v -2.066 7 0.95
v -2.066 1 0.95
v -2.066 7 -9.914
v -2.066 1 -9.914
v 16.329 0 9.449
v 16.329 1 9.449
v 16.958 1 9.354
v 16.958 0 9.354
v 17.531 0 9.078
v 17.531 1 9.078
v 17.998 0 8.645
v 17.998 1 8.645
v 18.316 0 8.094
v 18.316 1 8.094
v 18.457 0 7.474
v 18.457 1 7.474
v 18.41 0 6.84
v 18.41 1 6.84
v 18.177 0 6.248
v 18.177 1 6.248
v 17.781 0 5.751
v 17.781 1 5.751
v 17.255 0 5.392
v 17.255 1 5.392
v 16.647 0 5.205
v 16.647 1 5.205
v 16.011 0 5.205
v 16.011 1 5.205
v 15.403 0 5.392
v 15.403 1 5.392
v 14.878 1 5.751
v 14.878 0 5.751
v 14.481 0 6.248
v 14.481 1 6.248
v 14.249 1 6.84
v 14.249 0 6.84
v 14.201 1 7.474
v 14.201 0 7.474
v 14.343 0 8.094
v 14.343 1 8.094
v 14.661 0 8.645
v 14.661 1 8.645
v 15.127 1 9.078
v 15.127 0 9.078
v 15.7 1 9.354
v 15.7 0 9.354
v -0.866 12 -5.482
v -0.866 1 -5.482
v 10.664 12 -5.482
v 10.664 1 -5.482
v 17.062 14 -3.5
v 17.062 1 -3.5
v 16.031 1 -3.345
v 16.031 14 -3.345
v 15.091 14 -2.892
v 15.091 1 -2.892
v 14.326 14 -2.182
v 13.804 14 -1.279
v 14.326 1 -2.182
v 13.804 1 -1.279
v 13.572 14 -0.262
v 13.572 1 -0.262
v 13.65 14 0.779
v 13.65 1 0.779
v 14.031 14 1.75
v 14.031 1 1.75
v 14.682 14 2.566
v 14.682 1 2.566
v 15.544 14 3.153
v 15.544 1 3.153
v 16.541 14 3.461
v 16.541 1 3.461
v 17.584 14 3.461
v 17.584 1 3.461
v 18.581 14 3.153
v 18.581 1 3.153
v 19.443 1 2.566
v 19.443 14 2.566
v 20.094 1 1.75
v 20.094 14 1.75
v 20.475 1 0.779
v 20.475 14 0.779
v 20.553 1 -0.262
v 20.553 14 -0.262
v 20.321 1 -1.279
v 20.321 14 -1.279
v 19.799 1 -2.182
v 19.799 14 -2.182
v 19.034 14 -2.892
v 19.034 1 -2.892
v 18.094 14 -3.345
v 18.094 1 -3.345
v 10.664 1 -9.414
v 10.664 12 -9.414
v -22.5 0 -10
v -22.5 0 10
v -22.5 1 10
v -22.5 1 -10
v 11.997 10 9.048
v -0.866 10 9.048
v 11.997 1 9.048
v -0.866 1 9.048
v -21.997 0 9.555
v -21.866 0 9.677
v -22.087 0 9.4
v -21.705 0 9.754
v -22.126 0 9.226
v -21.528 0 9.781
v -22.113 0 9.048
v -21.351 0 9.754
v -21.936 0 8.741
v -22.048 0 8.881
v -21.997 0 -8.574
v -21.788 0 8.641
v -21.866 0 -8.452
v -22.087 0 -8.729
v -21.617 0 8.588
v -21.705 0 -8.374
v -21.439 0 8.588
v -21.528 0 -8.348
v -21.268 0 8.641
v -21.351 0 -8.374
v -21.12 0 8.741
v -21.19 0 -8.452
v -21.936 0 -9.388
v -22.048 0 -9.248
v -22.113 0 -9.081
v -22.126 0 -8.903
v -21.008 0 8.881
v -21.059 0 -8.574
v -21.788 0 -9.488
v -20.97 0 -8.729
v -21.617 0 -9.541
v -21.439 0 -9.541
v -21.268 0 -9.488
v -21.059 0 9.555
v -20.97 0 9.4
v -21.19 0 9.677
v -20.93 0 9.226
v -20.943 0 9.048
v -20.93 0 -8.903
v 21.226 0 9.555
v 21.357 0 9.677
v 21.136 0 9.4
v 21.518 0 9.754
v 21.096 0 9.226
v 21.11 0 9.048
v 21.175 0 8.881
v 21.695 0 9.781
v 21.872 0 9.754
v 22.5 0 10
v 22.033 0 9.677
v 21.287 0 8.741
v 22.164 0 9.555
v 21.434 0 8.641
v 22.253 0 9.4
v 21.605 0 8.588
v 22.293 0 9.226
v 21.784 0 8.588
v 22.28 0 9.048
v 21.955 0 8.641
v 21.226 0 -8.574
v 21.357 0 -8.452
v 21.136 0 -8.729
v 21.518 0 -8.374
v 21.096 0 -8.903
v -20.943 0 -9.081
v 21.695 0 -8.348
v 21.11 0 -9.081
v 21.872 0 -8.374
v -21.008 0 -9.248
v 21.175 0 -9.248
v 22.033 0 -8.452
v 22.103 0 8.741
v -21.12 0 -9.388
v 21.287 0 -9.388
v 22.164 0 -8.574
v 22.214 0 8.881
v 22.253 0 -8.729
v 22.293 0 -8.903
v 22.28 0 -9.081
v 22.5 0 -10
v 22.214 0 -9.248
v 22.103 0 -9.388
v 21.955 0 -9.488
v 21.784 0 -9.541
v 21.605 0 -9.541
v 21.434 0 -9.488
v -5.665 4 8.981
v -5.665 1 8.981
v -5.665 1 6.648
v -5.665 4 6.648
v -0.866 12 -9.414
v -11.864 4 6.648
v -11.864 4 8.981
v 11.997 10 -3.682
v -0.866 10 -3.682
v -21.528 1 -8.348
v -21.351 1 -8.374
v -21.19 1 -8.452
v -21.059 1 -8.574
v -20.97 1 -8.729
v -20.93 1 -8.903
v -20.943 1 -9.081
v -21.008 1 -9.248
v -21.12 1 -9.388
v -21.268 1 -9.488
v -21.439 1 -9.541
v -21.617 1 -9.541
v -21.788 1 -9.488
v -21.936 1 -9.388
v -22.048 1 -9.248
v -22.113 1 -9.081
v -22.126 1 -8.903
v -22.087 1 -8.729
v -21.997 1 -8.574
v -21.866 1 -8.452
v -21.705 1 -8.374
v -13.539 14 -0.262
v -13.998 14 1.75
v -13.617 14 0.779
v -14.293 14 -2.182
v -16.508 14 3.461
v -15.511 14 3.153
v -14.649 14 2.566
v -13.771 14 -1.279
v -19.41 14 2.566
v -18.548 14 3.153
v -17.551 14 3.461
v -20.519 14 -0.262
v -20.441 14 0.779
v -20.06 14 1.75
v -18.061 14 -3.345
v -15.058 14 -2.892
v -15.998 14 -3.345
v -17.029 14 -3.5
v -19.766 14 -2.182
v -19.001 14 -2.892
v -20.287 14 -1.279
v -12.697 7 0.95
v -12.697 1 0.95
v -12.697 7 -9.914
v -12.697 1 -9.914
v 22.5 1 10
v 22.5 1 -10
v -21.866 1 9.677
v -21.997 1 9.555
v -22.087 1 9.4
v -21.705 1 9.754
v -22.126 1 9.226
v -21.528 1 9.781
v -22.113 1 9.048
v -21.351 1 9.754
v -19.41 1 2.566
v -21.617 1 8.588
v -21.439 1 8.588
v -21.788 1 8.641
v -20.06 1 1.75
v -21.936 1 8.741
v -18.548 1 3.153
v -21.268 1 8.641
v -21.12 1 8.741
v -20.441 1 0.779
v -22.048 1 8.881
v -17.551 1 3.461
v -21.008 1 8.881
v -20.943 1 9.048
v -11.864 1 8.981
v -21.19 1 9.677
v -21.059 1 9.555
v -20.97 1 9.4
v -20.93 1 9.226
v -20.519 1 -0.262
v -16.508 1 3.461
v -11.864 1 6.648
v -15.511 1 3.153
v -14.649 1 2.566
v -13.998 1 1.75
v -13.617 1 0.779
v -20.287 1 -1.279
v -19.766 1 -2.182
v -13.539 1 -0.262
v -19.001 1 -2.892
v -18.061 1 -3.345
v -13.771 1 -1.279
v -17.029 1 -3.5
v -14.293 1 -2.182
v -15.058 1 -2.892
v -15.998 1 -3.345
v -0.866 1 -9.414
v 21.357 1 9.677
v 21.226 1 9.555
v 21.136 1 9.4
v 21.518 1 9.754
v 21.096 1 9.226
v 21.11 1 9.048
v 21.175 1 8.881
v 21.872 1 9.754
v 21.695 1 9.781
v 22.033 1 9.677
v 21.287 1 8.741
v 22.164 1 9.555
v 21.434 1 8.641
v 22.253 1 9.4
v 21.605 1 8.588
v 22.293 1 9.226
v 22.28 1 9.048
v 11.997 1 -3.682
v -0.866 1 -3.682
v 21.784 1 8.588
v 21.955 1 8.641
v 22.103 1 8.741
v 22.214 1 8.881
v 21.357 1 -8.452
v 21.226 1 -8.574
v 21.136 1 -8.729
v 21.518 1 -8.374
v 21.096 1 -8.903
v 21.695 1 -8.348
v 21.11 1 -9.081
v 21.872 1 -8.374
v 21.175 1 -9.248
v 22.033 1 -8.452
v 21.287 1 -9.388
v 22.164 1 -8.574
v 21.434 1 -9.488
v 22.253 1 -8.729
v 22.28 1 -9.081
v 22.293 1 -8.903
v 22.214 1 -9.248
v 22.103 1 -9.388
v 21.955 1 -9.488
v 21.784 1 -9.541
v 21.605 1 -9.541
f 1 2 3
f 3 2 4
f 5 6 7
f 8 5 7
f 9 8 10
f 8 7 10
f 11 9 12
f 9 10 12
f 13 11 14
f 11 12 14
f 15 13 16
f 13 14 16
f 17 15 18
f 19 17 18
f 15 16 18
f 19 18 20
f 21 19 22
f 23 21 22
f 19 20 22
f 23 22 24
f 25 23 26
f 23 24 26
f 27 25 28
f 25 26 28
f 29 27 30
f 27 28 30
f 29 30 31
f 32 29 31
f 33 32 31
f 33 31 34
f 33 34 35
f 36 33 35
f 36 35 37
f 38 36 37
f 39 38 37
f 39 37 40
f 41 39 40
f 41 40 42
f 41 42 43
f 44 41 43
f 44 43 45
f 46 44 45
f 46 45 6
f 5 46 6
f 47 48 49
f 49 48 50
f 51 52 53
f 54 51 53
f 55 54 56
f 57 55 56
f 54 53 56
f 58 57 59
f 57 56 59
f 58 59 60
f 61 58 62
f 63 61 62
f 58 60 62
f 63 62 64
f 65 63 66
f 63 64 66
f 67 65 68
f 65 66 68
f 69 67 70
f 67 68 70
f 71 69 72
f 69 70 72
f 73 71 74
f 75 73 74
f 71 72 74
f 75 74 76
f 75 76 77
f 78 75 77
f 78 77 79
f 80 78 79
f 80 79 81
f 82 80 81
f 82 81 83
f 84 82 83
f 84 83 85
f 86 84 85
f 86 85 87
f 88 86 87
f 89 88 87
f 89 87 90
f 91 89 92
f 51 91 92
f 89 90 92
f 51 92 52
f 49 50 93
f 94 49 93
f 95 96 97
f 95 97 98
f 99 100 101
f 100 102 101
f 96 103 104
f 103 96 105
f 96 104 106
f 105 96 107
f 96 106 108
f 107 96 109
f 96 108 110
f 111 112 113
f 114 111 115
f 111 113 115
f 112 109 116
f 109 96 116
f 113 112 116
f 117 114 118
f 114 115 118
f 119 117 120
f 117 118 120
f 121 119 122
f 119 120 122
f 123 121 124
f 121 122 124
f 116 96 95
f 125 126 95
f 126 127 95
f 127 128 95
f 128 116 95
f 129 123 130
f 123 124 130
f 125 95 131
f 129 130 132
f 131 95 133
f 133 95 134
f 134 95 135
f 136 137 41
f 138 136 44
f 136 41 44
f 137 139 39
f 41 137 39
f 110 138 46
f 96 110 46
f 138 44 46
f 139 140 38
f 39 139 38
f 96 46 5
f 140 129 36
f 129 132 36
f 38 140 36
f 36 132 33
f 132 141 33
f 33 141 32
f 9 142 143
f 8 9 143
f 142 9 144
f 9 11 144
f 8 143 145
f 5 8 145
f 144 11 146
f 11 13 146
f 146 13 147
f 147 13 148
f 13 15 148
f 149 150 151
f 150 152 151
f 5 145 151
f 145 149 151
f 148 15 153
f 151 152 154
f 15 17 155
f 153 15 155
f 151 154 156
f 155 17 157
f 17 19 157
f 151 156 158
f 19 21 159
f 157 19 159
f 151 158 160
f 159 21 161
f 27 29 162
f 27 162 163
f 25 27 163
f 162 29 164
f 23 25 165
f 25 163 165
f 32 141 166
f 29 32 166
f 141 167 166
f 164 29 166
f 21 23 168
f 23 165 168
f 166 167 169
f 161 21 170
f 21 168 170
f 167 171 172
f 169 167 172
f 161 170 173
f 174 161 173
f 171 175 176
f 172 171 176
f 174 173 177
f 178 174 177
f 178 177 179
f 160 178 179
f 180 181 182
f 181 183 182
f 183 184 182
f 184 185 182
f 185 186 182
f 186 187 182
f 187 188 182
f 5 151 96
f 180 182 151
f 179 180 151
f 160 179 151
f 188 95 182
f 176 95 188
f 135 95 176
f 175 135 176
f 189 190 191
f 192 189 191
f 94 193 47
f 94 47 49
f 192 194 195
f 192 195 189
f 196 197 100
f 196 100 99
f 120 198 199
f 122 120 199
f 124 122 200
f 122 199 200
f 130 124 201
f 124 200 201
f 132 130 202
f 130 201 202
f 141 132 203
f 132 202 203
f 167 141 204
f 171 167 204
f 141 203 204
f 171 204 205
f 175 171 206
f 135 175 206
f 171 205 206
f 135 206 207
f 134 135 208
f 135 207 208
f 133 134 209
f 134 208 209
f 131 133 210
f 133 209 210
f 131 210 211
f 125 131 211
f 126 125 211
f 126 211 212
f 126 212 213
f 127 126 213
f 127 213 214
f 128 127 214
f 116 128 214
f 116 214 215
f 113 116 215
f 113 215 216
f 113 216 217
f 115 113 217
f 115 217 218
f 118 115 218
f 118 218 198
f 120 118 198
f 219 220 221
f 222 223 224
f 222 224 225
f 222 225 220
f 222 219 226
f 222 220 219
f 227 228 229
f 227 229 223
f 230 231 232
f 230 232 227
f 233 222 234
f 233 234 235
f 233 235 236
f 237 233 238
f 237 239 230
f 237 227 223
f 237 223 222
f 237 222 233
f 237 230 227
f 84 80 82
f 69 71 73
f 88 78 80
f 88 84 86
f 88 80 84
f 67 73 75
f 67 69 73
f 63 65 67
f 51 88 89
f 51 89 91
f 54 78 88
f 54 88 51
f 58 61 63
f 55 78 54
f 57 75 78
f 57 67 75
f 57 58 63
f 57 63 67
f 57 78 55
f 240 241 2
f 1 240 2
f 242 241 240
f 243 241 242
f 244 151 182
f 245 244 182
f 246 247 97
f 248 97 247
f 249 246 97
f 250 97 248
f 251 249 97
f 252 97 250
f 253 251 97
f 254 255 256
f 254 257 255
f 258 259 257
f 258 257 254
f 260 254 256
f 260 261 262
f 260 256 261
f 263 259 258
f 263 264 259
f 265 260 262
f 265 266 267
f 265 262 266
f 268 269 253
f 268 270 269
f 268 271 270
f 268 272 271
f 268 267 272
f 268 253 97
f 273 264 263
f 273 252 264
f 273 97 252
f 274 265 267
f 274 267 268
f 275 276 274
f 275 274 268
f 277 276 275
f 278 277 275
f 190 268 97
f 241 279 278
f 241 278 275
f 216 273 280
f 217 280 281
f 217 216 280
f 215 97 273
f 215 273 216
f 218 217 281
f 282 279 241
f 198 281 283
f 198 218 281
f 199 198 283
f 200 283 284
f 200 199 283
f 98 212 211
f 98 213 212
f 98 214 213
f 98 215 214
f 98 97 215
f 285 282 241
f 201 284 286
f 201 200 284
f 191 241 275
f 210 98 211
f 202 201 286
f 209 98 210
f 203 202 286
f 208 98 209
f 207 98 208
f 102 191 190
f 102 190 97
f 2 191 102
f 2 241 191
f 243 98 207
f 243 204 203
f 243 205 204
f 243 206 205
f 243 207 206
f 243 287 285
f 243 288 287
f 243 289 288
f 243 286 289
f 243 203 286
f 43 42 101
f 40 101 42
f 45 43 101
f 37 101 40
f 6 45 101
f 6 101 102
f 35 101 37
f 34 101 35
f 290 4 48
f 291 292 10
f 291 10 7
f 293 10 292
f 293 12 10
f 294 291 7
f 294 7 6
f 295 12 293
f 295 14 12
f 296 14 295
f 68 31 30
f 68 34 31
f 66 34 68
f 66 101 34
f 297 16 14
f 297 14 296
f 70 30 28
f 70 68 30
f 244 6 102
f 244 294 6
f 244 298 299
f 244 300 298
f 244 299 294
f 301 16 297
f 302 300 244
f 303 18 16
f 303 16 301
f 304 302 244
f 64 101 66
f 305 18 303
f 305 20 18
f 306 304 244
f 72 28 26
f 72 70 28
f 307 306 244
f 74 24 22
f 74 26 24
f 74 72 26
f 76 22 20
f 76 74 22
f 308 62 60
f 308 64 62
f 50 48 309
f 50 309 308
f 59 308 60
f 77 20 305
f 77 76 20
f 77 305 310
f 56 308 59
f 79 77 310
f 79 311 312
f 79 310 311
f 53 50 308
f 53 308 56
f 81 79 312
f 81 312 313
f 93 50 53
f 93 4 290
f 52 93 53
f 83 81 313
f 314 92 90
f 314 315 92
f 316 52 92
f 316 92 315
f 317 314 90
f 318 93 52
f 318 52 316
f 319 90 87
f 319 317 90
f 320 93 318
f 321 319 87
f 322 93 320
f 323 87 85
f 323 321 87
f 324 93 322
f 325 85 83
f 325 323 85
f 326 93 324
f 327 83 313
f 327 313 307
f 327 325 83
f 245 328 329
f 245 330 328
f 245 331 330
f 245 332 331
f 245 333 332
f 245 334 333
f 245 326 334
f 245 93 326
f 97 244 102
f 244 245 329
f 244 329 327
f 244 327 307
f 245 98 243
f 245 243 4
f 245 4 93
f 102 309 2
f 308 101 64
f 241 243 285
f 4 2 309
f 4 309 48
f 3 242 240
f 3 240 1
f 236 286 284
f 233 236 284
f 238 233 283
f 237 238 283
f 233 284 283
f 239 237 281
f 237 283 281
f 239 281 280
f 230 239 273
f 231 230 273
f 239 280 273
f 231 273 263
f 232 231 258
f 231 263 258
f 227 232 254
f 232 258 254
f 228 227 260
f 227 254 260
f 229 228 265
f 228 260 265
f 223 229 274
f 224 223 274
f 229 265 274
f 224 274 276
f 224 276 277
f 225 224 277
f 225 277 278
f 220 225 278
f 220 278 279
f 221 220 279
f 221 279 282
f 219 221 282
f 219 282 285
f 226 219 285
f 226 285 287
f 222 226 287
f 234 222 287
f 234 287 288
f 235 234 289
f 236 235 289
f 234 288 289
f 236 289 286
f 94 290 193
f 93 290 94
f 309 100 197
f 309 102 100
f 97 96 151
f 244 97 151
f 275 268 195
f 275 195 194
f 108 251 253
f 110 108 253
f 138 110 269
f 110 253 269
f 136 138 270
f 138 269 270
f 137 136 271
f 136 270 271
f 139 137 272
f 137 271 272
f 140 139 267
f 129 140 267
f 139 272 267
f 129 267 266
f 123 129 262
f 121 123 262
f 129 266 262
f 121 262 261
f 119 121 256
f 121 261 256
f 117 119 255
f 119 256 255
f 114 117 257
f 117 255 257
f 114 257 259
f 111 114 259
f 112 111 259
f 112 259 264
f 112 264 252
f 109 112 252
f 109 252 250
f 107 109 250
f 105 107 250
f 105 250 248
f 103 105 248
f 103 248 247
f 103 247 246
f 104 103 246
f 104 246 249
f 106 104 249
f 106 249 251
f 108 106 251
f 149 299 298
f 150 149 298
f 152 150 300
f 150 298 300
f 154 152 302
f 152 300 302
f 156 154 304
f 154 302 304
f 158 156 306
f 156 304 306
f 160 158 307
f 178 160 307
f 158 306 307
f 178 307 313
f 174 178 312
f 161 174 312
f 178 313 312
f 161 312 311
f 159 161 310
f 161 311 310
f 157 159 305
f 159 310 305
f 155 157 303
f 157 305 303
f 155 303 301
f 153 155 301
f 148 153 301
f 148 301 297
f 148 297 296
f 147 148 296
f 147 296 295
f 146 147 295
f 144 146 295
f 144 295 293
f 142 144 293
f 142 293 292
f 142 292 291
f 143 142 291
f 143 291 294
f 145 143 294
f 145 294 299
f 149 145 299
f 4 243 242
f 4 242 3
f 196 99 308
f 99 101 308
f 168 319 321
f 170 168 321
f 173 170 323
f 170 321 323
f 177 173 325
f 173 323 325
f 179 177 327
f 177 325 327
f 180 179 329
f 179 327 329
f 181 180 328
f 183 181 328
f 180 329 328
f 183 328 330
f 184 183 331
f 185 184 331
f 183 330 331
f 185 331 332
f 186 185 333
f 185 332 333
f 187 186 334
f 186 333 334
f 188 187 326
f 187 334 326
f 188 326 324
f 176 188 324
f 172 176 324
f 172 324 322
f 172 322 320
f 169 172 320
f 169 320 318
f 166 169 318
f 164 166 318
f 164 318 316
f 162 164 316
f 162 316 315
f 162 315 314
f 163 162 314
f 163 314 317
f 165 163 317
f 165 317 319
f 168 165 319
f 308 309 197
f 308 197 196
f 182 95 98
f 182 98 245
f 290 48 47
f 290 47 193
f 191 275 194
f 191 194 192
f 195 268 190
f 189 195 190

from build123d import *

# Parameters (mm, degrees)
SKETCH1_W           = 45
SKETCH1_H           = 20
BOSS_EXTRUDE1_DEPTH = 1
SKETCH2_R           = 3.5
BOSS_EXTRUDE3_DEPTH = 13
SKETCH3_W           = 11.530514465
SKETCH3_H           = 3.932371985
BOSS_EXTRUDE4_DEPTH = 11
SKETCH4_W           = 10.630734434
SKETCH4_H           = 10.864010739
SKETCH4_W_2         = 12.863521917
SKETCH4_H_2         = 12.730221172
BOSS_EXTRUDE5_DEPTH = 6
SKETCH5_W           = 12.863521917
SKETCH5_H           = 12.730221172
BOSS_EXTRUDE6_DEPTH = 3
SKETCH6_W           = 6.198484655
SKETCH6_H           = 2.332763042
BOSS_EXTRUDE7_DEPTH = 3
SKETCH7_R           = 0.6
SKETCH7_R_2         = 2.133853082
CUT_EXTRUDE1_DEPTH  = 28.843311585


with BuildPart() as part:
    # Sketch1 → Boss-Extrude1 (new body)
    with BuildSketch(Plane(origin=(0, 0, 0), x_dir=(1, 0, 0), z_dir=(0, 1, 0))):
        Rectangle(SKETCH1_W, SKETCH1_H)
    extrude(amount=BOSS_EXTRUDE1_DEPTH)

    # Sketch2 → Boss-Extrude3 (add)
    with BuildSketch(Plane(origin=(0, 1, 0), x_dir=(1, 0, 0), z_dir=(0, 1, 0))):
        with Locations(Location((-17.029170207, 0, 0), (0, 0, 90))):
            Circle(SKETCH2_R)
        with Locations(Location((17.062495393, 0, 0), (0, 0, 90))):
            Circle(SKETCH2_R)
    extrude(amount=BOSS_EXTRUDE3_DEPTH)

    # Sketch3 → Boss-Extrude4 (add)
    with BuildSketch(Plane(origin=(0, 1, 0), x_dir=(1, 0, 0), z_dir=(0, 1, 0))):
        with Locations((4.898802389, 7.448179142)):
            Rectangle(SKETCH3_W, SKETCH3_H)
    extrude(amount=BOSS_EXTRUDE4_DEPTH)

    # Sketch4 → Boss-Extrude5 (add)
    with BuildSketch(Plane(origin=(0, 1, 0), x_dir=(1, 0, 0), z_dir=(0, 1, 0))):
        with Locations((-7.381528769, 4.482237559)):
            Rectangle(SKETCH4_W, SKETCH4_H)
        with Locations((5.565306115, -2.682677498)):
            Rectangle(SKETCH4_W_2, SKETCH4_H_2)
    extrude(amount=BOSS_EXTRUDE5_DEPTH)

    # Sketch5 → Boss-Extrude6 (add)
    with BuildSketch(Plane(origin=(0, 7, 0), x_dir=(1, 0, 0), z_dir=(0, 1, 0))):
        with Locations((5.565306115, -2.682677498)):
            Rectangle(SKETCH5_W, SKETCH5_H)
    extrude(amount=BOSS_EXTRUDE6_DEPTH)

    # Sketch6 → Boss-Extrude7 (add)
    with BuildSketch(Plane(origin=(0, 1, 0), x_dir=(1, 0, 0), z_dir=(0, 1, 0))):
        with Locations((-8.764524, -7.814756191)):
            Rectangle(SKETCH6_W, SKETCH6_H)
    extrude(amount=BOSS_EXTRUDE7_DEPTH)

    # Sketch7 → Cut-Extrude1 (cut, through all)
    with BuildSketch(Plane(origin=(0, 1, 0), x_dir=(1, 0, 0), z_dir=(0, 1, 0))):
        with Locations(Location((-21.528070359, 8.947812525, 0), (0, 0, 270))):
            Circle(SKETCH7_R)
        with Locations(Location((-21.528070359, -9.18108883, 0), (0, 0, 270))):
            Circle(SKETCH7_R)
        with Locations(Location((21.694696291, -9.18108883, 0), (0, 0, 270))):
            Circle(SKETCH7_R)
        with Locations(Location((21.694696291, 8.947812525, 0), (0, 0, 270))):
            Circle(SKETCH7_R)
        with Locations(Location((16.329341294, -7.314878396, 0), (0, 0, 270))):
            Circle(SKETCH7_R_2)
    extrude(amount=-CUT_EXTRUDE1_DEPTH, mode=Mode.SUBTRACT)


solid = part.part
